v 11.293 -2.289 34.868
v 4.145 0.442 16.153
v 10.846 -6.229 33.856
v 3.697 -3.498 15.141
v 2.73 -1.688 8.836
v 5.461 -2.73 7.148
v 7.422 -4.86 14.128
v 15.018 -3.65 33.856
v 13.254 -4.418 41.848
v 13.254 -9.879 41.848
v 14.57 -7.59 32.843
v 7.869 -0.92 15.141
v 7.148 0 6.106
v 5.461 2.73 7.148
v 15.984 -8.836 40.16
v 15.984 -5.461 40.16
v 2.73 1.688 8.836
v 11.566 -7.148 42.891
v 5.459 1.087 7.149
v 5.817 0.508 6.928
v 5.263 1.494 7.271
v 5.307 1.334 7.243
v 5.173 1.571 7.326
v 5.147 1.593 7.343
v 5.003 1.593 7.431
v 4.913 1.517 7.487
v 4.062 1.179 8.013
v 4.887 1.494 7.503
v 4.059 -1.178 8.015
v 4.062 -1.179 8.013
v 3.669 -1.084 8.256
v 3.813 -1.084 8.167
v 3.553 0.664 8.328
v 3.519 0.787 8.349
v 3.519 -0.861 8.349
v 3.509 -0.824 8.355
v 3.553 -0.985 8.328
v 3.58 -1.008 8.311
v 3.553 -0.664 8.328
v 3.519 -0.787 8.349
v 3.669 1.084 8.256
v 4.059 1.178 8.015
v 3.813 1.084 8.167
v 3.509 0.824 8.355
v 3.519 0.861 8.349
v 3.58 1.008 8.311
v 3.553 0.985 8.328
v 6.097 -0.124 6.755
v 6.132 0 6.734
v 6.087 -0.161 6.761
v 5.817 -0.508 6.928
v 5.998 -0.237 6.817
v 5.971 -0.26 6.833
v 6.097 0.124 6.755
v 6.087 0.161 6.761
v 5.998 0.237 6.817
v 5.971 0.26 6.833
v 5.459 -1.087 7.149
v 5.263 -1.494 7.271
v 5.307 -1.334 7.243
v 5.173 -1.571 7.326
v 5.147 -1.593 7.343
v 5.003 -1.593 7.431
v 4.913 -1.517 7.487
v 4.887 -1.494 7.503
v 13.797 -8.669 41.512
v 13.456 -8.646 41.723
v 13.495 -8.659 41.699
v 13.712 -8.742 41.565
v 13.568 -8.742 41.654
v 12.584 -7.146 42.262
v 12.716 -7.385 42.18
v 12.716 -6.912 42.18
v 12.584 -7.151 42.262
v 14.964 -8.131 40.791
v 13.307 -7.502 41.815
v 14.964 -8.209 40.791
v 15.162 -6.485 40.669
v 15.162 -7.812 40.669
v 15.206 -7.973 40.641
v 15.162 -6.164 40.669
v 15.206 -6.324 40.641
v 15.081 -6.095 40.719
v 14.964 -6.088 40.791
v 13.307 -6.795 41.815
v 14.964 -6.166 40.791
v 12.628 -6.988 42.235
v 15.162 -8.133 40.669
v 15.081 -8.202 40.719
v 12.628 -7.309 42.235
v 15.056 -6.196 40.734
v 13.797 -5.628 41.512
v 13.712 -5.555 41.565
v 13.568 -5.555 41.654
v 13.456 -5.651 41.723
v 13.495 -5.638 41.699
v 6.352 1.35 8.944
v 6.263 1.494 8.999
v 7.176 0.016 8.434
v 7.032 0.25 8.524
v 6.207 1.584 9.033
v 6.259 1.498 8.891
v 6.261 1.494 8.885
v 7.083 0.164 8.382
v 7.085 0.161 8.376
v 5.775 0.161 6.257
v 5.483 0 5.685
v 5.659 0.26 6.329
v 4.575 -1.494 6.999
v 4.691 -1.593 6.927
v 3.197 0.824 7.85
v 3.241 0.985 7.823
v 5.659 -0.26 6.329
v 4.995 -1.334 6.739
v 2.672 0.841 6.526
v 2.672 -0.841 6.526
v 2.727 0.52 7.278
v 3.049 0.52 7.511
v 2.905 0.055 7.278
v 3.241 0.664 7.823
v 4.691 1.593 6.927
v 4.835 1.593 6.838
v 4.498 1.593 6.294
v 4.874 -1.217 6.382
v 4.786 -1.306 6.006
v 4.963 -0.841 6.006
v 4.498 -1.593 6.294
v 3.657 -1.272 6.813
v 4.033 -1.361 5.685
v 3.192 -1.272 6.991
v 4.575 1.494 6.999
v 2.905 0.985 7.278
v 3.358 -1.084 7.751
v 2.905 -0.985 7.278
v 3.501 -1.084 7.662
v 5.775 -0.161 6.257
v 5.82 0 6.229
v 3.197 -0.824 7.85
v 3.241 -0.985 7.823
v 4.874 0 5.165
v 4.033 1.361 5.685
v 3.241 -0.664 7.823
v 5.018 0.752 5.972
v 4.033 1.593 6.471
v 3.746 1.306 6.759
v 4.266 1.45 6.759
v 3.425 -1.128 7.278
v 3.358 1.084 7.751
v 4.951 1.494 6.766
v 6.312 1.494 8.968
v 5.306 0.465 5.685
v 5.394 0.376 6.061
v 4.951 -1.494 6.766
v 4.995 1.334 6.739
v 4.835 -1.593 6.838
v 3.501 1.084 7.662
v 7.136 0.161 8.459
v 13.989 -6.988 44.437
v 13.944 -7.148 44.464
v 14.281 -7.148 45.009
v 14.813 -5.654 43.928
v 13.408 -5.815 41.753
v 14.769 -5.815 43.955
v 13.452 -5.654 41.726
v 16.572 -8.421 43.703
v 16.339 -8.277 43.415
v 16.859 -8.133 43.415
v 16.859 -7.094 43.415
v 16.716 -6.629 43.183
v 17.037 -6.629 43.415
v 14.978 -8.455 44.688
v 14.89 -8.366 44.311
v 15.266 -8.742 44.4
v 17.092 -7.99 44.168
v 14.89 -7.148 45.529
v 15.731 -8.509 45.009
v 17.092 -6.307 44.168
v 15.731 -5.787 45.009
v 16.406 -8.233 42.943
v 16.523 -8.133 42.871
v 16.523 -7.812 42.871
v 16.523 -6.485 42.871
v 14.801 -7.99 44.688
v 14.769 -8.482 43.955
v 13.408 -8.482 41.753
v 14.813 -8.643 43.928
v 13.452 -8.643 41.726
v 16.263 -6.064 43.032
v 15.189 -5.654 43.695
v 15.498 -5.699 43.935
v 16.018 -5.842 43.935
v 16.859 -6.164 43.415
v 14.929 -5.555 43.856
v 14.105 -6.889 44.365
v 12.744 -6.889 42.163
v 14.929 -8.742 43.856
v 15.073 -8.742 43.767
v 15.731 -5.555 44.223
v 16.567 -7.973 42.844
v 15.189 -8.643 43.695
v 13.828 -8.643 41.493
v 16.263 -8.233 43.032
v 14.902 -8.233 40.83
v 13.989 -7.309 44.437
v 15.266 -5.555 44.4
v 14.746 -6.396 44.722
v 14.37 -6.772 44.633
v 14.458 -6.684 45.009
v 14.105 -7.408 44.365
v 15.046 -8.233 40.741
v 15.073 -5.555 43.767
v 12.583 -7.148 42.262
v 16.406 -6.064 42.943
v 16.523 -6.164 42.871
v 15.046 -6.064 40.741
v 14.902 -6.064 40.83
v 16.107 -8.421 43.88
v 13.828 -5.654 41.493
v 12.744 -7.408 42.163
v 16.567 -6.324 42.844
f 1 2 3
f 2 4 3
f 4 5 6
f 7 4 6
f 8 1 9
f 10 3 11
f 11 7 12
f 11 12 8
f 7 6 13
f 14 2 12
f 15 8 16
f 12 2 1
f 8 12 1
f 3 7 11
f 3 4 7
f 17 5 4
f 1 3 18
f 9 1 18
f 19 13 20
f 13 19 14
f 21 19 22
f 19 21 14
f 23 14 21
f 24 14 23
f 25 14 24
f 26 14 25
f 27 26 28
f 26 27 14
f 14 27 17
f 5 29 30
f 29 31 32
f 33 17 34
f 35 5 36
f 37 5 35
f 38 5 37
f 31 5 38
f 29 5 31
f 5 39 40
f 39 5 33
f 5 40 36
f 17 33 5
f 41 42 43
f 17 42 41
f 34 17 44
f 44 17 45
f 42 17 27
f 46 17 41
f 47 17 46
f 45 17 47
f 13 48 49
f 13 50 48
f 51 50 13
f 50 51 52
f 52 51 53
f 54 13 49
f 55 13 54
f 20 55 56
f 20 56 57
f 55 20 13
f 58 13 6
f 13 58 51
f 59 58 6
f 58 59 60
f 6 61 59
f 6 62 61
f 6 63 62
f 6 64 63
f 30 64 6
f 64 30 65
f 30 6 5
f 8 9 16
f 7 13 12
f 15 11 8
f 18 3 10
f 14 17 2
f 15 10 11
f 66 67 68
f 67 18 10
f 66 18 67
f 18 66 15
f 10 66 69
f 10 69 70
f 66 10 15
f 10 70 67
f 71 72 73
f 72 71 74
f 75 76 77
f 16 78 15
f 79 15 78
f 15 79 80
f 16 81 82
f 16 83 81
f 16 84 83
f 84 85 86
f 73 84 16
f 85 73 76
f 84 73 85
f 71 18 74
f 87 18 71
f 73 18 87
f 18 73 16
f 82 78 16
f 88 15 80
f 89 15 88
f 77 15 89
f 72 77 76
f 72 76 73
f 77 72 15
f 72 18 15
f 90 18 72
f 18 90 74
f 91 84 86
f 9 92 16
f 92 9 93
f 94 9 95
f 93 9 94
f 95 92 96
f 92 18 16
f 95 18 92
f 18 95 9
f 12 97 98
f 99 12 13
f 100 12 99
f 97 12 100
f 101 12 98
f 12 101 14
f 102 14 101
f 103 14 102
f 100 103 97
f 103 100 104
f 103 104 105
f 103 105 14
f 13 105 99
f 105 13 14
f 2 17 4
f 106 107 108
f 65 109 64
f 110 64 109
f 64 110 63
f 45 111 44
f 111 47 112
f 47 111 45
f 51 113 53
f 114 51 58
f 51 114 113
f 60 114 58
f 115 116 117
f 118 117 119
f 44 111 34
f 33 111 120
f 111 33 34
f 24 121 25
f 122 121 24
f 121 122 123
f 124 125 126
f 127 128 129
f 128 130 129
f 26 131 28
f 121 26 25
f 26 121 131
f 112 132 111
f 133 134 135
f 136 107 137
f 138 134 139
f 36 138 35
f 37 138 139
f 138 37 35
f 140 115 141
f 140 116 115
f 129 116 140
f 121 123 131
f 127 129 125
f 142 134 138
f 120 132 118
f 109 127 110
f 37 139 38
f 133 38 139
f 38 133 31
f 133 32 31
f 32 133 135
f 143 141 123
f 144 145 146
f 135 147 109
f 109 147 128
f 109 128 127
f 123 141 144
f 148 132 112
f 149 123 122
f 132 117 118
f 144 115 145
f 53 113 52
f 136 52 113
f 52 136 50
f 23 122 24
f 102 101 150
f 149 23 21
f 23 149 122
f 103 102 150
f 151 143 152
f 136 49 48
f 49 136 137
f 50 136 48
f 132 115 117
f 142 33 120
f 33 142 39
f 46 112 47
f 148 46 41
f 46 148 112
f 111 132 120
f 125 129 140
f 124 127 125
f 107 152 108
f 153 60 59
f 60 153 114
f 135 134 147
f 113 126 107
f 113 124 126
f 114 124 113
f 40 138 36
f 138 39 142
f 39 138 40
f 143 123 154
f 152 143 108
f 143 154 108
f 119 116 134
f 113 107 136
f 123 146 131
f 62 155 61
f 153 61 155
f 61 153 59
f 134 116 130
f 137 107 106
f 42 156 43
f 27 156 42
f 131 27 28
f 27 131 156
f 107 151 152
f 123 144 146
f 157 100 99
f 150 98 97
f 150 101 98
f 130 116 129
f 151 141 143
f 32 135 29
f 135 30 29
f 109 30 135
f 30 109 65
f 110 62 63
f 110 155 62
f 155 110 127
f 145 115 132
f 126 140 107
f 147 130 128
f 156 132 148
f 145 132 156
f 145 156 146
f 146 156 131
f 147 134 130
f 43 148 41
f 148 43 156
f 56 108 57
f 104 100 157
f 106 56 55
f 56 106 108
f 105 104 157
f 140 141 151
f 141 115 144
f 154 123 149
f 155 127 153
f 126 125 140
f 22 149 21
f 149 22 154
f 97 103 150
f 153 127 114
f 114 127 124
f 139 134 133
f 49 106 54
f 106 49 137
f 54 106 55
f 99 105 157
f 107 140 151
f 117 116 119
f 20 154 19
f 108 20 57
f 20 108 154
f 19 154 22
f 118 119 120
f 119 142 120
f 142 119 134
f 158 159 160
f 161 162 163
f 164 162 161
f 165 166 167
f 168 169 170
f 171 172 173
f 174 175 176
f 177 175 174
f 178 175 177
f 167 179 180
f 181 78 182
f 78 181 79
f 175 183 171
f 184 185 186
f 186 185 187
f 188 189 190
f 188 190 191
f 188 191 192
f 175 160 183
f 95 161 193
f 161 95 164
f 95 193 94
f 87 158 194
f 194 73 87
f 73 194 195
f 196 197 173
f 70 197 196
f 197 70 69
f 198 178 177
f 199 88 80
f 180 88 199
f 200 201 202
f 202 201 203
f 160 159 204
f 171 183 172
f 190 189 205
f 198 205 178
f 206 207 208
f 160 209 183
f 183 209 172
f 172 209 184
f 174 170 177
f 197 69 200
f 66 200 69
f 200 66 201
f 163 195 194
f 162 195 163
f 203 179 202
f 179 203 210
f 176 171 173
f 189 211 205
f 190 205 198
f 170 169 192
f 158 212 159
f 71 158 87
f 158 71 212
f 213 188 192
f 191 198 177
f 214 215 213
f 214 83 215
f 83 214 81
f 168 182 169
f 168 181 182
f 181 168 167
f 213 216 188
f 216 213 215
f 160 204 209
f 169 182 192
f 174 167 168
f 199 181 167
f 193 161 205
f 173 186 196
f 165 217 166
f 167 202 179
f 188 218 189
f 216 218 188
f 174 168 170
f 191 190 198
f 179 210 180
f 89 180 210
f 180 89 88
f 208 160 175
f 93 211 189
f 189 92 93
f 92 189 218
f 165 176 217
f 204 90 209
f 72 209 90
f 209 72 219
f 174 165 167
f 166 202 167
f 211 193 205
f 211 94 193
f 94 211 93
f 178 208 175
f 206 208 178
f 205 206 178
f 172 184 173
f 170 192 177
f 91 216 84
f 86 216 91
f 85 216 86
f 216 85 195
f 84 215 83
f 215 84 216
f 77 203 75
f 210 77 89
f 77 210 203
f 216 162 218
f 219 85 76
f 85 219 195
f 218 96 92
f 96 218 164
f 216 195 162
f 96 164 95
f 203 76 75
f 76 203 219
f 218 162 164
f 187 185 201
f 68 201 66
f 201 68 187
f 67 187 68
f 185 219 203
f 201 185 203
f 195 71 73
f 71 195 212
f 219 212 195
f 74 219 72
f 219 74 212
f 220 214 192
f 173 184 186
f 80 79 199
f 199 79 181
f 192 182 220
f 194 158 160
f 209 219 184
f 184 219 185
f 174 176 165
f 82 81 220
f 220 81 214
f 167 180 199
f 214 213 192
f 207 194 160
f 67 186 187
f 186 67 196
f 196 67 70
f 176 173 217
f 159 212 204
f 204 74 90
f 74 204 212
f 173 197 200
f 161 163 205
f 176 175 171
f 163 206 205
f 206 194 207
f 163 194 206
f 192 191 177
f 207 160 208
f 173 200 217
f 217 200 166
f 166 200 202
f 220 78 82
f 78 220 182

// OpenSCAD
sc=(4+2*sqrt(5))/cos(16.5);
points=[[ 0.000000, -4.236068, 2.618034 ], [ 0.000000, 0.000000, 0.000000 ], [ 0.302439, -0.095195, 0.738580 ], [ 0.302439, 0.095195, 0.738580 ], [ 0.308650, 0.058834, 0.823725 ], [ 0.309017, -0.190983, 1.000000 ], [ 0.309017, 0.190983, 1.000000 ], [ 0.328750, -0.111456, 0.823725 ], [ 0.328750, 0.006211, 0.823725 ], [ 0.328750, 0.111456, 0.823725 ], [ 0.345012, 0.058834, 0.850037 ], [ 0.361273, -0.143979, 0.791203 ], [ 0.361803, -0.093276, 0.888443 ], [ 0.361803, 0.093276, 0.888443 ], [ 0.366828, -0.111456, 0.885337 ], [ 0.366828, -0.075095, 0.885337 ], [ 0.366828, 0.075095, 0.885337 ], [ 0.366828, 0.111456, 0.885337 ], [ 0.379984, -0.122692, 0.877206 ], [ 0.379984, 0.122692, 0.877206 ], [ 0.387584, -0.127717, 0.823725 ], [ 0.396245, -0.122692, 0.867156 ], [ 0.396245, 0.122692, 0.867156 ], [ 0.413895, -0.143979, 0.771103 ], [ 0.418441, -0.395898, 1.713525 ], [ 0.423945, 0.147817, 0.764892 ], [ 0.456468, -0.154029, 0.643386 ], [ 0.456468, 0.154029, 0.643386 ], [ 0.456468, 0.180340, 0.732369 ], [ 0.469098, 0.050000, 1.828115 ], [ 0.482779, 0.164079, 0.764892 ], [ 0.509090, -0.180340, 0.712269 ], [ 0.509090, 0.180340, 0.712269 ], [ 0.515832, -0.093276, 1.137666 ], [ 0.515832, 0.093276, 1.137666 ], [ 0.517751, -0.169104, 0.792061 ], [ 0.517751, 0.169104, 0.792061 ], [ 0.520857, -0.111456, 1.134560 ], [ 0.520857, -0.075095, 1.134560 ], [ 0.520857, 0.075095, 1.134560 ], [ 0.520857, 0.111456, 1.134560 ], [ 0.530907, -0.180340, 0.783931 ], [ 0.530907, 0.180340, 0.783931 ], [ 0.534013, -0.122692, 1.126430 ], [ 0.534013, 0.122692, 1.126430 ], [ 0.541613, -0.147817, 0.679747 ], [ 0.547168, -0.180340, 0.773881 ], [ 0.547168, 0.180340, 0.773881 ], [ 0.550274, -0.122692, 1.116380 ], [ 0.550274, 0.122692, 1.116380 ], [ 0.551663, -0.137767, 0.722319 ], [ 0.551663, 0.000000, 0.584552 ], [ 0.560324, -0.169104, 0.765750 ], [ 0.560324, 0.169104, 0.765750 ], [ 0.561713, -0.095195, 0.679747 ], [ 0.565349, -0.150923, 0.762644 ], [ 0.565349, 0.150923, 0.762644 ], [ 0.567924, 0.085145, 0.675908 ], [ 0.600446, 0.052622, 0.643386 ], [ 0.610496, 0.042572, 0.685958 ], [ 0.618034, -0.309017, 0.809017 ], [ 0.618034, 0.309017, 0.809017 ], [ 0.620546, 0.000000, 0.643386 ], [ 0.640444, -0.029417, 0.716233 ], [ 0.640444, 0.029417, 0.716233 ], [ 0.653599, -0.018181, 0.708103 ], [ 0.653599, 0.018181, 0.708103 ], [ 0.658624, 0.000000, 0.704997 ], [ 0.671780, -0.169104, 1.041285 ], [ 0.671780, 0.169104, 1.041285 ], [ 0.684936, -0.180340, 1.033154 ], [ 0.684936, 0.180340, 1.033154 ], [ 0.701197, -0.180340, 1.023104 ], [ 0.701197, 0.180340, 1.023104 ], [ 0.714353, -0.169104, 1.014974 ], [ 0.714353, 0.169104, 1.014974 ], [ 0.719378, -0.150923, 1.011868 ], [ 0.719378, 0.150923, 1.011868 ], [ 0.794473, -0.029417, 0.965457 ], [ 0.794473, 0.029417, 0.965457 ], [ 0.807628, -0.018181, 0.957326 ], [ 0.807628, 0.018181, 0.957326 ], [ 0.809017, 0.000000, 0.690983 ], [ 0.812653, 0.000000, 0.954221 ], [ 0.839919, -0.550000, 1.598936 ], [ 0.890576, -0.104102, 1.713525 ], [ 1.227458, -0.704915, 3.831559 ], [ 1.278115, -0.259017, 3.946149 ], [ 1.309017, -0.809017, 4.854102 ], [ 1.424109, -0.809017, 4.782971 ], [ 1.429134, -0.827198, 4.779865 ], [ 1.429134, -0.790836, 4.779865 ], [ 1.442290, -0.838434, 4.771735 ], [ 1.442290, -0.779600, 4.771735 ], [ 1.500000, -1.118034, 4.736068 ], [ 1.500000, -0.500000, 4.736068 ], [ 1.517385, -0.959940, 4.725324 ], [ 1.517385, -0.658094, 4.725324 ], [ 1.522410, -0.978121, 4.722218 ], [ 1.522410, -0.639913, 4.722218 ], [ 1.535565, -0.989357, 4.714087 ], [ 1.535565, -0.628677, 4.714087 ], [ 1.551827, -0.989357, 4.704037 ], [ 1.551827, -0.628677, 4.704037 ], [ 1.564982, -0.978121, 4.695907 ], [ 1.564982, -0.639913, 4.695907 ], [ 1.578138, -0.809017, 5.032195 ], [ 1.583163, -0.827198, 5.029089 ], [ 1.583163, -0.790836, 5.029089 ], [ 1.596319, -0.838434, 5.020958 ], [ 1.596319, -0.779600, 5.020958 ], [ 1.616216, -0.809017, 5.093806 ], [ 1.626266, -0.766445, 5.051234 ], [ 1.636316, -0.756395, 5.093806 ], [ 1.648936, -0.859017, 3.716970 ], [ 1.668838, -0.723872, 5.061284 ], [ 1.671414, -0.959940, 4.974547 ], [ 1.671414, -0.658094, 4.974547 ], [ 1.675050, -0.904212, 5.057445 ], [ 1.676439, -0.978121, 4.971442 ], [ 1.676439, -0.639913, 4.971442 ], [ 1.685100, -0.946784, 5.014872 ], [ 1.685100, -0.809017, 5.152640 ], [ 1.686489, -0.931709, 4.620812 ], [ 1.686489, -0.686325, 4.620812 ], [ 1.689594, -0.989357, 4.963311 ], [ 1.689594, -0.628677, 4.963311 ], [ 1.695150, -0.956834, 5.057445 ], [ 1.699593, -0.413119, 3.831559 ], [ 1.702750, -0.931709, 4.610762 ], [ 1.702750, -0.686325, 4.610762 ], [ 1.705855, -0.989357, 4.953261 ], [ 1.705855, -0.628677, 4.953261 ], [ 1.715905, -0.920473, 4.602631 ], [ 1.715905, -0.884112, 4.602631 ], [ 1.715905, -0.733922, 4.602631 ], [ 1.715905, -0.697561, 4.602631 ], [ 1.719011, -0.978121, 4.945130 ], [ 1.719011, -0.639913, 4.945130 ], [ 1.720930, -0.902293, 4.599526 ], [ 1.720930, -0.715741, 4.599526 ], [ 1.727672, -0.989357, 5.024922 ], [ 1.727672, -0.628677, 5.024922 ], [ 1.753983, -0.644938, 4.972300 ], [ 1.780295, -0.963046, 5.093806 ], [ 1.780295, -0.654988, 5.093806 ], [ 1.780295, -0.628677, 5.004822 ], [ 1.809017, -1.000000, 4.545085 ], [ 1.809017, -0.618034, 4.545085 ], [ 1.812817, -0.661200, 4.972300 ], [ 1.822867, -0.952996, 4.966089 ], [ 1.840517, -0.931709, 4.870035 ], [ 1.840517, -0.686325, 4.870035 ], [ 1.849178, -0.936734, 4.913466 ], [ 1.856778, -0.931709, 4.859985 ], [ 1.856778, -0.686325, 4.859985 ], [ 1.869934, -0.920473, 4.851855 ], [ 1.869934, -0.884112, 4.851855 ], [ 1.869934, -0.733922, 4.851855 ], [ 1.869934, -0.697561, 4.851855 ], [ 1.874959, -0.902293, 4.848749 ], [ 1.874959, -0.715741, 4.848749 ], [ 1.875490, -0.952996, 4.945989 ], [ 1.891751, -0.750183, 4.887155 ], [ 1.908012, -0.920473, 4.913466 ], [ 1.908012, -0.802806, 4.913466 ], [ 1.908012, -0.697561, 4.913466 ], [ 1.928112, -0.750183, 4.913466 ], [ 1.934323, -0.904212, 4.998611 ], [ 1.934323, -0.713822, 4.998611 ], [ 2.118034, -0.809017, 5.545085 ]];

scale(sc) render() {
color("#00993F") polyhedron(points,faces=[[ 86, 87, 29, 24 ],[ 60, 24, 5 ],[ 60, 84, 24 ],[ 95, 128, 87 ],[ 94, 86, 114 ],[ 128, 114, 84, 85 ],[ 60, 82, 84 ],[ 61, 29, 85 ],[ 148, 147, 128 ],[ 87, 128, 85, 29 ],[ 114, 86, 24, 84 ],[ 5, 24, 6 ],[ 87, 86, 88 ],[ 95, 87, 88 ],[ 60, 5, 6, 61, 82 ],[ 95, 148, 128 ],[ 84, 82, 85 ],[ 114, 128, 147 ],[ 94, 88, 86 ],[ 61, 6, 29 ],[ 94, 114, 147 ],[ 95, 88, 94, 147, 148 ],[ 61, 85, 82 ],[ 29, 6, 24 ]]);
color("#D91218") polyhedron(points,faces=[[ 64, 66, 62 ],[ 70, 68, 35, 41 ],[ 34, 40, 17, 13 ],[ 78, 76, 55, 63 ],[ 3, 2, 4 ],[ 4, 8, 10 ],[ 39, 34, 13, 16 ],[ 42, 47, 32 ],[ 45, 54, 50 ],[ 23, 26, 31 ],[ 11, 26, 23 ],[ 69, 71, 42, 36 ],[ 13, 17, 9 ],[ 21, 18, 7 ],[ 67, 65, 62 ],[ 14, 12, 7 ],[ 37, 33, 12, 14 ],[ 3, 27, 51, 26, 2 ],[ 36, 42, 32 ],[ 45, 31, 26 ],[ 12, 15, 7 ],[ 16, 9, 10 ],[ 71, 73, 47, 42 ],[ 41, 35, 31 ],[ 43, 37, 14, 18 ],[ 48, 43, 18, 21 ],[ 57, 27, 32 ],[ 28, 25, 30 ],[ 31, 35, 21, 20, 23 ],[ 28, 32, 27 ],[ 17, 19, 9 ],[ 47, 53, 32 ],[ 10, 9, 4 ],[ 28, 3, 25 ],[ 80, 78, 63, 65 ],[ 73, 75, 53, 47 ],[ 58, 57, 59 ],[ 83, 80, 65, 67 ],[ 4, 9, 3 ],[ 38, 39, 16, 15 ],[ 40, 44, 19, 17 ],[ 16, 13, 9 ],[ 26, 51, 45 ],[ 50, 31, 45 ],[ 64, 62, 59 ],[ 76, 74, 52, 55 ],[ 21, 7, 20 ],[ 62, 63, 55, 50, 54 ],[ 33, 38, 15, 12 ],[ 32, 56, 64, 59, 57 ],[ 8, 2, 7 ],[ 65, 63, 62 ],[ 36, 32, 30 ],[ 74, 72, 46, 52 ],[ 11, 7, 2 ],[ 66, 67, 62 ],[ 49, 69, 36, 22 ],[ 59, 62, 58 ],[ 30, 32, 28 ],[ 77, 75, 73, 71, 69, 49, 44, 40, 34, 39, 38, 33, 37, 43, 48, 68, 70, 72, 74, 76, 78, 80, 83, 81, 79 ],[ 2, 26, 11 ],[ 72, 70, 41, 46 ],[ 58, 27, 57 ],[ 68, 48, 21, 35 ],[ 46, 41, 31 ],[ 25, 3, 9 ],[ 54, 51, 62 ],[ 11, 23, 20 ],[ 19, 22, 9 ],[ 9, 22, 36, 30, 25 ],[ 20, 7, 11 ],[ 44, 49, 22, 19 ],[ 79, 81, 66, 64 ],[ 51, 27, 58 ],[ 27, 3, 28 ],[ 53, 56, 32 ],[ 52, 46, 31 ],[ 45, 51, 54 ],[ 75, 77, 56, 53 ],[ 55, 52, 31 ],[ 55, 31, 50 ],[ 18, 14, 7 ],[ 81, 83, 67, 66 ],[ 58, 62, 51 ],[ 4, 2, 8 ],[ 77, 79, 64, 56 ],[ 7, 15, 16, 10, 8 ]]);
color("#008EC2") polyhedron(points,faces=[[ 108, 106, 111 ],[ 99, 97, 117, 120 ],[ 153, 164, 162 ],[ 167, 165, 163 ],[ 121, 141, 127 ],[ 145, 122, 144, 168, 169 ],[ 154, 156, 164 ],[ 134, 135, 158, 157 ],[ 127, 122, 118 ],[ 96, 98, 119, 116 ],[ 166, 152, 138, 143, 149 ],[ 118, 122, 111 ],[ 101, 99, 120, 126 ],[ 93, 91, 108, 110 ],[ 100, 102, 131, 125 ],[ 145, 169, 146 ],[ 133, 139, 160, 156 ],[ 104, 123, 151, 137 ],[ 106, 107, 111 ],[ 127, 118, 121 ],[ 138, 142, 143 ],[ 146, 142, 145 ],[ 113, 115, 112 ],[ 111, 109, 116, 121, 118 ],[ 169, 168, 167 ],[ 102, 104, 137, 131 ],[ 97, 93, 110, 117 ],[ 123, 129, 154, 151 ],[ 127, 141, 144 ],[ 138, 132, 142 ],[ 143, 142, 146 ],[ 163, 166, 167 ],[ 91, 89, 106, 108 ],[ 155, 152, 166 ],[ 146, 169, 149 ],[ 136, 130, 155, 159 ],[ 164, 157, 158, 163, 165 ],[ 130, 124, 152, 155 ],[ 107, 109, 111 ],[ 158, 166, 163 ],[ 165, 168, 164 ],[ 160, 157, 164 ],[ 126, 120, 142 ],[ 119, 125, 141 ],[ 162, 150, 153 ],[ 151, 154, 164 ],[ 124, 105, 138, 152 ],[ 167, 168, 165 ],[ 146, 149, 143 ],[ 129, 133, 156, 154 ],[ 113, 111, 122 ],[ 105, 103, 132, 138 ],[ 162, 144, 150 ],[ 90, 92, 109, 107 ],[ 162, 164, 168 ],[ 151, 164, 153 ],[ 132, 126, 142 ],[ 103, 101, 126, 132 ],[ 122, 145, 113 ],[ 113, 145, 115 ],[ 115, 145, 142 ],[ 116, 141, 121 ],[ 167, 166, 169 ],[ 97, 99, 101, 103, 105, 124, 130, 136, 140, 135, 134, 139, 133, 129, 123, 104, 102, 100, 98, 96, 92, 90, 89, 91, 93 ],[ 161, 159, 166 ],[ 116, 119, 141 ],[ 139, 134, 157, 160 ],[ 158, 161, 166 ],[ 110, 108, 111 ],[ 92, 96, 116, 109 ],[ 168, 144, 162 ],[ 140, 136, 159, 161 ],[ 156, 160, 164 ],[ 159, 155, 166 ],[ 125, 131, 141 ],[ 110, 111, 112 ],[ 98, 100, 125, 119 ],[ 150, 144, 141 ],[ 89, 90, 107, 106 ],[ 131, 137, 141 ],[ 120, 117, 142 ],[ 144, 122, 127 ],[ 142, 117, 110, 112, 115 ],[ 149, 169, 166 ],[ 112, 111, 113 ],[ 141, 137, 151, 153, 150 ],[ 135, 140, 161, 158 ]]);
}
